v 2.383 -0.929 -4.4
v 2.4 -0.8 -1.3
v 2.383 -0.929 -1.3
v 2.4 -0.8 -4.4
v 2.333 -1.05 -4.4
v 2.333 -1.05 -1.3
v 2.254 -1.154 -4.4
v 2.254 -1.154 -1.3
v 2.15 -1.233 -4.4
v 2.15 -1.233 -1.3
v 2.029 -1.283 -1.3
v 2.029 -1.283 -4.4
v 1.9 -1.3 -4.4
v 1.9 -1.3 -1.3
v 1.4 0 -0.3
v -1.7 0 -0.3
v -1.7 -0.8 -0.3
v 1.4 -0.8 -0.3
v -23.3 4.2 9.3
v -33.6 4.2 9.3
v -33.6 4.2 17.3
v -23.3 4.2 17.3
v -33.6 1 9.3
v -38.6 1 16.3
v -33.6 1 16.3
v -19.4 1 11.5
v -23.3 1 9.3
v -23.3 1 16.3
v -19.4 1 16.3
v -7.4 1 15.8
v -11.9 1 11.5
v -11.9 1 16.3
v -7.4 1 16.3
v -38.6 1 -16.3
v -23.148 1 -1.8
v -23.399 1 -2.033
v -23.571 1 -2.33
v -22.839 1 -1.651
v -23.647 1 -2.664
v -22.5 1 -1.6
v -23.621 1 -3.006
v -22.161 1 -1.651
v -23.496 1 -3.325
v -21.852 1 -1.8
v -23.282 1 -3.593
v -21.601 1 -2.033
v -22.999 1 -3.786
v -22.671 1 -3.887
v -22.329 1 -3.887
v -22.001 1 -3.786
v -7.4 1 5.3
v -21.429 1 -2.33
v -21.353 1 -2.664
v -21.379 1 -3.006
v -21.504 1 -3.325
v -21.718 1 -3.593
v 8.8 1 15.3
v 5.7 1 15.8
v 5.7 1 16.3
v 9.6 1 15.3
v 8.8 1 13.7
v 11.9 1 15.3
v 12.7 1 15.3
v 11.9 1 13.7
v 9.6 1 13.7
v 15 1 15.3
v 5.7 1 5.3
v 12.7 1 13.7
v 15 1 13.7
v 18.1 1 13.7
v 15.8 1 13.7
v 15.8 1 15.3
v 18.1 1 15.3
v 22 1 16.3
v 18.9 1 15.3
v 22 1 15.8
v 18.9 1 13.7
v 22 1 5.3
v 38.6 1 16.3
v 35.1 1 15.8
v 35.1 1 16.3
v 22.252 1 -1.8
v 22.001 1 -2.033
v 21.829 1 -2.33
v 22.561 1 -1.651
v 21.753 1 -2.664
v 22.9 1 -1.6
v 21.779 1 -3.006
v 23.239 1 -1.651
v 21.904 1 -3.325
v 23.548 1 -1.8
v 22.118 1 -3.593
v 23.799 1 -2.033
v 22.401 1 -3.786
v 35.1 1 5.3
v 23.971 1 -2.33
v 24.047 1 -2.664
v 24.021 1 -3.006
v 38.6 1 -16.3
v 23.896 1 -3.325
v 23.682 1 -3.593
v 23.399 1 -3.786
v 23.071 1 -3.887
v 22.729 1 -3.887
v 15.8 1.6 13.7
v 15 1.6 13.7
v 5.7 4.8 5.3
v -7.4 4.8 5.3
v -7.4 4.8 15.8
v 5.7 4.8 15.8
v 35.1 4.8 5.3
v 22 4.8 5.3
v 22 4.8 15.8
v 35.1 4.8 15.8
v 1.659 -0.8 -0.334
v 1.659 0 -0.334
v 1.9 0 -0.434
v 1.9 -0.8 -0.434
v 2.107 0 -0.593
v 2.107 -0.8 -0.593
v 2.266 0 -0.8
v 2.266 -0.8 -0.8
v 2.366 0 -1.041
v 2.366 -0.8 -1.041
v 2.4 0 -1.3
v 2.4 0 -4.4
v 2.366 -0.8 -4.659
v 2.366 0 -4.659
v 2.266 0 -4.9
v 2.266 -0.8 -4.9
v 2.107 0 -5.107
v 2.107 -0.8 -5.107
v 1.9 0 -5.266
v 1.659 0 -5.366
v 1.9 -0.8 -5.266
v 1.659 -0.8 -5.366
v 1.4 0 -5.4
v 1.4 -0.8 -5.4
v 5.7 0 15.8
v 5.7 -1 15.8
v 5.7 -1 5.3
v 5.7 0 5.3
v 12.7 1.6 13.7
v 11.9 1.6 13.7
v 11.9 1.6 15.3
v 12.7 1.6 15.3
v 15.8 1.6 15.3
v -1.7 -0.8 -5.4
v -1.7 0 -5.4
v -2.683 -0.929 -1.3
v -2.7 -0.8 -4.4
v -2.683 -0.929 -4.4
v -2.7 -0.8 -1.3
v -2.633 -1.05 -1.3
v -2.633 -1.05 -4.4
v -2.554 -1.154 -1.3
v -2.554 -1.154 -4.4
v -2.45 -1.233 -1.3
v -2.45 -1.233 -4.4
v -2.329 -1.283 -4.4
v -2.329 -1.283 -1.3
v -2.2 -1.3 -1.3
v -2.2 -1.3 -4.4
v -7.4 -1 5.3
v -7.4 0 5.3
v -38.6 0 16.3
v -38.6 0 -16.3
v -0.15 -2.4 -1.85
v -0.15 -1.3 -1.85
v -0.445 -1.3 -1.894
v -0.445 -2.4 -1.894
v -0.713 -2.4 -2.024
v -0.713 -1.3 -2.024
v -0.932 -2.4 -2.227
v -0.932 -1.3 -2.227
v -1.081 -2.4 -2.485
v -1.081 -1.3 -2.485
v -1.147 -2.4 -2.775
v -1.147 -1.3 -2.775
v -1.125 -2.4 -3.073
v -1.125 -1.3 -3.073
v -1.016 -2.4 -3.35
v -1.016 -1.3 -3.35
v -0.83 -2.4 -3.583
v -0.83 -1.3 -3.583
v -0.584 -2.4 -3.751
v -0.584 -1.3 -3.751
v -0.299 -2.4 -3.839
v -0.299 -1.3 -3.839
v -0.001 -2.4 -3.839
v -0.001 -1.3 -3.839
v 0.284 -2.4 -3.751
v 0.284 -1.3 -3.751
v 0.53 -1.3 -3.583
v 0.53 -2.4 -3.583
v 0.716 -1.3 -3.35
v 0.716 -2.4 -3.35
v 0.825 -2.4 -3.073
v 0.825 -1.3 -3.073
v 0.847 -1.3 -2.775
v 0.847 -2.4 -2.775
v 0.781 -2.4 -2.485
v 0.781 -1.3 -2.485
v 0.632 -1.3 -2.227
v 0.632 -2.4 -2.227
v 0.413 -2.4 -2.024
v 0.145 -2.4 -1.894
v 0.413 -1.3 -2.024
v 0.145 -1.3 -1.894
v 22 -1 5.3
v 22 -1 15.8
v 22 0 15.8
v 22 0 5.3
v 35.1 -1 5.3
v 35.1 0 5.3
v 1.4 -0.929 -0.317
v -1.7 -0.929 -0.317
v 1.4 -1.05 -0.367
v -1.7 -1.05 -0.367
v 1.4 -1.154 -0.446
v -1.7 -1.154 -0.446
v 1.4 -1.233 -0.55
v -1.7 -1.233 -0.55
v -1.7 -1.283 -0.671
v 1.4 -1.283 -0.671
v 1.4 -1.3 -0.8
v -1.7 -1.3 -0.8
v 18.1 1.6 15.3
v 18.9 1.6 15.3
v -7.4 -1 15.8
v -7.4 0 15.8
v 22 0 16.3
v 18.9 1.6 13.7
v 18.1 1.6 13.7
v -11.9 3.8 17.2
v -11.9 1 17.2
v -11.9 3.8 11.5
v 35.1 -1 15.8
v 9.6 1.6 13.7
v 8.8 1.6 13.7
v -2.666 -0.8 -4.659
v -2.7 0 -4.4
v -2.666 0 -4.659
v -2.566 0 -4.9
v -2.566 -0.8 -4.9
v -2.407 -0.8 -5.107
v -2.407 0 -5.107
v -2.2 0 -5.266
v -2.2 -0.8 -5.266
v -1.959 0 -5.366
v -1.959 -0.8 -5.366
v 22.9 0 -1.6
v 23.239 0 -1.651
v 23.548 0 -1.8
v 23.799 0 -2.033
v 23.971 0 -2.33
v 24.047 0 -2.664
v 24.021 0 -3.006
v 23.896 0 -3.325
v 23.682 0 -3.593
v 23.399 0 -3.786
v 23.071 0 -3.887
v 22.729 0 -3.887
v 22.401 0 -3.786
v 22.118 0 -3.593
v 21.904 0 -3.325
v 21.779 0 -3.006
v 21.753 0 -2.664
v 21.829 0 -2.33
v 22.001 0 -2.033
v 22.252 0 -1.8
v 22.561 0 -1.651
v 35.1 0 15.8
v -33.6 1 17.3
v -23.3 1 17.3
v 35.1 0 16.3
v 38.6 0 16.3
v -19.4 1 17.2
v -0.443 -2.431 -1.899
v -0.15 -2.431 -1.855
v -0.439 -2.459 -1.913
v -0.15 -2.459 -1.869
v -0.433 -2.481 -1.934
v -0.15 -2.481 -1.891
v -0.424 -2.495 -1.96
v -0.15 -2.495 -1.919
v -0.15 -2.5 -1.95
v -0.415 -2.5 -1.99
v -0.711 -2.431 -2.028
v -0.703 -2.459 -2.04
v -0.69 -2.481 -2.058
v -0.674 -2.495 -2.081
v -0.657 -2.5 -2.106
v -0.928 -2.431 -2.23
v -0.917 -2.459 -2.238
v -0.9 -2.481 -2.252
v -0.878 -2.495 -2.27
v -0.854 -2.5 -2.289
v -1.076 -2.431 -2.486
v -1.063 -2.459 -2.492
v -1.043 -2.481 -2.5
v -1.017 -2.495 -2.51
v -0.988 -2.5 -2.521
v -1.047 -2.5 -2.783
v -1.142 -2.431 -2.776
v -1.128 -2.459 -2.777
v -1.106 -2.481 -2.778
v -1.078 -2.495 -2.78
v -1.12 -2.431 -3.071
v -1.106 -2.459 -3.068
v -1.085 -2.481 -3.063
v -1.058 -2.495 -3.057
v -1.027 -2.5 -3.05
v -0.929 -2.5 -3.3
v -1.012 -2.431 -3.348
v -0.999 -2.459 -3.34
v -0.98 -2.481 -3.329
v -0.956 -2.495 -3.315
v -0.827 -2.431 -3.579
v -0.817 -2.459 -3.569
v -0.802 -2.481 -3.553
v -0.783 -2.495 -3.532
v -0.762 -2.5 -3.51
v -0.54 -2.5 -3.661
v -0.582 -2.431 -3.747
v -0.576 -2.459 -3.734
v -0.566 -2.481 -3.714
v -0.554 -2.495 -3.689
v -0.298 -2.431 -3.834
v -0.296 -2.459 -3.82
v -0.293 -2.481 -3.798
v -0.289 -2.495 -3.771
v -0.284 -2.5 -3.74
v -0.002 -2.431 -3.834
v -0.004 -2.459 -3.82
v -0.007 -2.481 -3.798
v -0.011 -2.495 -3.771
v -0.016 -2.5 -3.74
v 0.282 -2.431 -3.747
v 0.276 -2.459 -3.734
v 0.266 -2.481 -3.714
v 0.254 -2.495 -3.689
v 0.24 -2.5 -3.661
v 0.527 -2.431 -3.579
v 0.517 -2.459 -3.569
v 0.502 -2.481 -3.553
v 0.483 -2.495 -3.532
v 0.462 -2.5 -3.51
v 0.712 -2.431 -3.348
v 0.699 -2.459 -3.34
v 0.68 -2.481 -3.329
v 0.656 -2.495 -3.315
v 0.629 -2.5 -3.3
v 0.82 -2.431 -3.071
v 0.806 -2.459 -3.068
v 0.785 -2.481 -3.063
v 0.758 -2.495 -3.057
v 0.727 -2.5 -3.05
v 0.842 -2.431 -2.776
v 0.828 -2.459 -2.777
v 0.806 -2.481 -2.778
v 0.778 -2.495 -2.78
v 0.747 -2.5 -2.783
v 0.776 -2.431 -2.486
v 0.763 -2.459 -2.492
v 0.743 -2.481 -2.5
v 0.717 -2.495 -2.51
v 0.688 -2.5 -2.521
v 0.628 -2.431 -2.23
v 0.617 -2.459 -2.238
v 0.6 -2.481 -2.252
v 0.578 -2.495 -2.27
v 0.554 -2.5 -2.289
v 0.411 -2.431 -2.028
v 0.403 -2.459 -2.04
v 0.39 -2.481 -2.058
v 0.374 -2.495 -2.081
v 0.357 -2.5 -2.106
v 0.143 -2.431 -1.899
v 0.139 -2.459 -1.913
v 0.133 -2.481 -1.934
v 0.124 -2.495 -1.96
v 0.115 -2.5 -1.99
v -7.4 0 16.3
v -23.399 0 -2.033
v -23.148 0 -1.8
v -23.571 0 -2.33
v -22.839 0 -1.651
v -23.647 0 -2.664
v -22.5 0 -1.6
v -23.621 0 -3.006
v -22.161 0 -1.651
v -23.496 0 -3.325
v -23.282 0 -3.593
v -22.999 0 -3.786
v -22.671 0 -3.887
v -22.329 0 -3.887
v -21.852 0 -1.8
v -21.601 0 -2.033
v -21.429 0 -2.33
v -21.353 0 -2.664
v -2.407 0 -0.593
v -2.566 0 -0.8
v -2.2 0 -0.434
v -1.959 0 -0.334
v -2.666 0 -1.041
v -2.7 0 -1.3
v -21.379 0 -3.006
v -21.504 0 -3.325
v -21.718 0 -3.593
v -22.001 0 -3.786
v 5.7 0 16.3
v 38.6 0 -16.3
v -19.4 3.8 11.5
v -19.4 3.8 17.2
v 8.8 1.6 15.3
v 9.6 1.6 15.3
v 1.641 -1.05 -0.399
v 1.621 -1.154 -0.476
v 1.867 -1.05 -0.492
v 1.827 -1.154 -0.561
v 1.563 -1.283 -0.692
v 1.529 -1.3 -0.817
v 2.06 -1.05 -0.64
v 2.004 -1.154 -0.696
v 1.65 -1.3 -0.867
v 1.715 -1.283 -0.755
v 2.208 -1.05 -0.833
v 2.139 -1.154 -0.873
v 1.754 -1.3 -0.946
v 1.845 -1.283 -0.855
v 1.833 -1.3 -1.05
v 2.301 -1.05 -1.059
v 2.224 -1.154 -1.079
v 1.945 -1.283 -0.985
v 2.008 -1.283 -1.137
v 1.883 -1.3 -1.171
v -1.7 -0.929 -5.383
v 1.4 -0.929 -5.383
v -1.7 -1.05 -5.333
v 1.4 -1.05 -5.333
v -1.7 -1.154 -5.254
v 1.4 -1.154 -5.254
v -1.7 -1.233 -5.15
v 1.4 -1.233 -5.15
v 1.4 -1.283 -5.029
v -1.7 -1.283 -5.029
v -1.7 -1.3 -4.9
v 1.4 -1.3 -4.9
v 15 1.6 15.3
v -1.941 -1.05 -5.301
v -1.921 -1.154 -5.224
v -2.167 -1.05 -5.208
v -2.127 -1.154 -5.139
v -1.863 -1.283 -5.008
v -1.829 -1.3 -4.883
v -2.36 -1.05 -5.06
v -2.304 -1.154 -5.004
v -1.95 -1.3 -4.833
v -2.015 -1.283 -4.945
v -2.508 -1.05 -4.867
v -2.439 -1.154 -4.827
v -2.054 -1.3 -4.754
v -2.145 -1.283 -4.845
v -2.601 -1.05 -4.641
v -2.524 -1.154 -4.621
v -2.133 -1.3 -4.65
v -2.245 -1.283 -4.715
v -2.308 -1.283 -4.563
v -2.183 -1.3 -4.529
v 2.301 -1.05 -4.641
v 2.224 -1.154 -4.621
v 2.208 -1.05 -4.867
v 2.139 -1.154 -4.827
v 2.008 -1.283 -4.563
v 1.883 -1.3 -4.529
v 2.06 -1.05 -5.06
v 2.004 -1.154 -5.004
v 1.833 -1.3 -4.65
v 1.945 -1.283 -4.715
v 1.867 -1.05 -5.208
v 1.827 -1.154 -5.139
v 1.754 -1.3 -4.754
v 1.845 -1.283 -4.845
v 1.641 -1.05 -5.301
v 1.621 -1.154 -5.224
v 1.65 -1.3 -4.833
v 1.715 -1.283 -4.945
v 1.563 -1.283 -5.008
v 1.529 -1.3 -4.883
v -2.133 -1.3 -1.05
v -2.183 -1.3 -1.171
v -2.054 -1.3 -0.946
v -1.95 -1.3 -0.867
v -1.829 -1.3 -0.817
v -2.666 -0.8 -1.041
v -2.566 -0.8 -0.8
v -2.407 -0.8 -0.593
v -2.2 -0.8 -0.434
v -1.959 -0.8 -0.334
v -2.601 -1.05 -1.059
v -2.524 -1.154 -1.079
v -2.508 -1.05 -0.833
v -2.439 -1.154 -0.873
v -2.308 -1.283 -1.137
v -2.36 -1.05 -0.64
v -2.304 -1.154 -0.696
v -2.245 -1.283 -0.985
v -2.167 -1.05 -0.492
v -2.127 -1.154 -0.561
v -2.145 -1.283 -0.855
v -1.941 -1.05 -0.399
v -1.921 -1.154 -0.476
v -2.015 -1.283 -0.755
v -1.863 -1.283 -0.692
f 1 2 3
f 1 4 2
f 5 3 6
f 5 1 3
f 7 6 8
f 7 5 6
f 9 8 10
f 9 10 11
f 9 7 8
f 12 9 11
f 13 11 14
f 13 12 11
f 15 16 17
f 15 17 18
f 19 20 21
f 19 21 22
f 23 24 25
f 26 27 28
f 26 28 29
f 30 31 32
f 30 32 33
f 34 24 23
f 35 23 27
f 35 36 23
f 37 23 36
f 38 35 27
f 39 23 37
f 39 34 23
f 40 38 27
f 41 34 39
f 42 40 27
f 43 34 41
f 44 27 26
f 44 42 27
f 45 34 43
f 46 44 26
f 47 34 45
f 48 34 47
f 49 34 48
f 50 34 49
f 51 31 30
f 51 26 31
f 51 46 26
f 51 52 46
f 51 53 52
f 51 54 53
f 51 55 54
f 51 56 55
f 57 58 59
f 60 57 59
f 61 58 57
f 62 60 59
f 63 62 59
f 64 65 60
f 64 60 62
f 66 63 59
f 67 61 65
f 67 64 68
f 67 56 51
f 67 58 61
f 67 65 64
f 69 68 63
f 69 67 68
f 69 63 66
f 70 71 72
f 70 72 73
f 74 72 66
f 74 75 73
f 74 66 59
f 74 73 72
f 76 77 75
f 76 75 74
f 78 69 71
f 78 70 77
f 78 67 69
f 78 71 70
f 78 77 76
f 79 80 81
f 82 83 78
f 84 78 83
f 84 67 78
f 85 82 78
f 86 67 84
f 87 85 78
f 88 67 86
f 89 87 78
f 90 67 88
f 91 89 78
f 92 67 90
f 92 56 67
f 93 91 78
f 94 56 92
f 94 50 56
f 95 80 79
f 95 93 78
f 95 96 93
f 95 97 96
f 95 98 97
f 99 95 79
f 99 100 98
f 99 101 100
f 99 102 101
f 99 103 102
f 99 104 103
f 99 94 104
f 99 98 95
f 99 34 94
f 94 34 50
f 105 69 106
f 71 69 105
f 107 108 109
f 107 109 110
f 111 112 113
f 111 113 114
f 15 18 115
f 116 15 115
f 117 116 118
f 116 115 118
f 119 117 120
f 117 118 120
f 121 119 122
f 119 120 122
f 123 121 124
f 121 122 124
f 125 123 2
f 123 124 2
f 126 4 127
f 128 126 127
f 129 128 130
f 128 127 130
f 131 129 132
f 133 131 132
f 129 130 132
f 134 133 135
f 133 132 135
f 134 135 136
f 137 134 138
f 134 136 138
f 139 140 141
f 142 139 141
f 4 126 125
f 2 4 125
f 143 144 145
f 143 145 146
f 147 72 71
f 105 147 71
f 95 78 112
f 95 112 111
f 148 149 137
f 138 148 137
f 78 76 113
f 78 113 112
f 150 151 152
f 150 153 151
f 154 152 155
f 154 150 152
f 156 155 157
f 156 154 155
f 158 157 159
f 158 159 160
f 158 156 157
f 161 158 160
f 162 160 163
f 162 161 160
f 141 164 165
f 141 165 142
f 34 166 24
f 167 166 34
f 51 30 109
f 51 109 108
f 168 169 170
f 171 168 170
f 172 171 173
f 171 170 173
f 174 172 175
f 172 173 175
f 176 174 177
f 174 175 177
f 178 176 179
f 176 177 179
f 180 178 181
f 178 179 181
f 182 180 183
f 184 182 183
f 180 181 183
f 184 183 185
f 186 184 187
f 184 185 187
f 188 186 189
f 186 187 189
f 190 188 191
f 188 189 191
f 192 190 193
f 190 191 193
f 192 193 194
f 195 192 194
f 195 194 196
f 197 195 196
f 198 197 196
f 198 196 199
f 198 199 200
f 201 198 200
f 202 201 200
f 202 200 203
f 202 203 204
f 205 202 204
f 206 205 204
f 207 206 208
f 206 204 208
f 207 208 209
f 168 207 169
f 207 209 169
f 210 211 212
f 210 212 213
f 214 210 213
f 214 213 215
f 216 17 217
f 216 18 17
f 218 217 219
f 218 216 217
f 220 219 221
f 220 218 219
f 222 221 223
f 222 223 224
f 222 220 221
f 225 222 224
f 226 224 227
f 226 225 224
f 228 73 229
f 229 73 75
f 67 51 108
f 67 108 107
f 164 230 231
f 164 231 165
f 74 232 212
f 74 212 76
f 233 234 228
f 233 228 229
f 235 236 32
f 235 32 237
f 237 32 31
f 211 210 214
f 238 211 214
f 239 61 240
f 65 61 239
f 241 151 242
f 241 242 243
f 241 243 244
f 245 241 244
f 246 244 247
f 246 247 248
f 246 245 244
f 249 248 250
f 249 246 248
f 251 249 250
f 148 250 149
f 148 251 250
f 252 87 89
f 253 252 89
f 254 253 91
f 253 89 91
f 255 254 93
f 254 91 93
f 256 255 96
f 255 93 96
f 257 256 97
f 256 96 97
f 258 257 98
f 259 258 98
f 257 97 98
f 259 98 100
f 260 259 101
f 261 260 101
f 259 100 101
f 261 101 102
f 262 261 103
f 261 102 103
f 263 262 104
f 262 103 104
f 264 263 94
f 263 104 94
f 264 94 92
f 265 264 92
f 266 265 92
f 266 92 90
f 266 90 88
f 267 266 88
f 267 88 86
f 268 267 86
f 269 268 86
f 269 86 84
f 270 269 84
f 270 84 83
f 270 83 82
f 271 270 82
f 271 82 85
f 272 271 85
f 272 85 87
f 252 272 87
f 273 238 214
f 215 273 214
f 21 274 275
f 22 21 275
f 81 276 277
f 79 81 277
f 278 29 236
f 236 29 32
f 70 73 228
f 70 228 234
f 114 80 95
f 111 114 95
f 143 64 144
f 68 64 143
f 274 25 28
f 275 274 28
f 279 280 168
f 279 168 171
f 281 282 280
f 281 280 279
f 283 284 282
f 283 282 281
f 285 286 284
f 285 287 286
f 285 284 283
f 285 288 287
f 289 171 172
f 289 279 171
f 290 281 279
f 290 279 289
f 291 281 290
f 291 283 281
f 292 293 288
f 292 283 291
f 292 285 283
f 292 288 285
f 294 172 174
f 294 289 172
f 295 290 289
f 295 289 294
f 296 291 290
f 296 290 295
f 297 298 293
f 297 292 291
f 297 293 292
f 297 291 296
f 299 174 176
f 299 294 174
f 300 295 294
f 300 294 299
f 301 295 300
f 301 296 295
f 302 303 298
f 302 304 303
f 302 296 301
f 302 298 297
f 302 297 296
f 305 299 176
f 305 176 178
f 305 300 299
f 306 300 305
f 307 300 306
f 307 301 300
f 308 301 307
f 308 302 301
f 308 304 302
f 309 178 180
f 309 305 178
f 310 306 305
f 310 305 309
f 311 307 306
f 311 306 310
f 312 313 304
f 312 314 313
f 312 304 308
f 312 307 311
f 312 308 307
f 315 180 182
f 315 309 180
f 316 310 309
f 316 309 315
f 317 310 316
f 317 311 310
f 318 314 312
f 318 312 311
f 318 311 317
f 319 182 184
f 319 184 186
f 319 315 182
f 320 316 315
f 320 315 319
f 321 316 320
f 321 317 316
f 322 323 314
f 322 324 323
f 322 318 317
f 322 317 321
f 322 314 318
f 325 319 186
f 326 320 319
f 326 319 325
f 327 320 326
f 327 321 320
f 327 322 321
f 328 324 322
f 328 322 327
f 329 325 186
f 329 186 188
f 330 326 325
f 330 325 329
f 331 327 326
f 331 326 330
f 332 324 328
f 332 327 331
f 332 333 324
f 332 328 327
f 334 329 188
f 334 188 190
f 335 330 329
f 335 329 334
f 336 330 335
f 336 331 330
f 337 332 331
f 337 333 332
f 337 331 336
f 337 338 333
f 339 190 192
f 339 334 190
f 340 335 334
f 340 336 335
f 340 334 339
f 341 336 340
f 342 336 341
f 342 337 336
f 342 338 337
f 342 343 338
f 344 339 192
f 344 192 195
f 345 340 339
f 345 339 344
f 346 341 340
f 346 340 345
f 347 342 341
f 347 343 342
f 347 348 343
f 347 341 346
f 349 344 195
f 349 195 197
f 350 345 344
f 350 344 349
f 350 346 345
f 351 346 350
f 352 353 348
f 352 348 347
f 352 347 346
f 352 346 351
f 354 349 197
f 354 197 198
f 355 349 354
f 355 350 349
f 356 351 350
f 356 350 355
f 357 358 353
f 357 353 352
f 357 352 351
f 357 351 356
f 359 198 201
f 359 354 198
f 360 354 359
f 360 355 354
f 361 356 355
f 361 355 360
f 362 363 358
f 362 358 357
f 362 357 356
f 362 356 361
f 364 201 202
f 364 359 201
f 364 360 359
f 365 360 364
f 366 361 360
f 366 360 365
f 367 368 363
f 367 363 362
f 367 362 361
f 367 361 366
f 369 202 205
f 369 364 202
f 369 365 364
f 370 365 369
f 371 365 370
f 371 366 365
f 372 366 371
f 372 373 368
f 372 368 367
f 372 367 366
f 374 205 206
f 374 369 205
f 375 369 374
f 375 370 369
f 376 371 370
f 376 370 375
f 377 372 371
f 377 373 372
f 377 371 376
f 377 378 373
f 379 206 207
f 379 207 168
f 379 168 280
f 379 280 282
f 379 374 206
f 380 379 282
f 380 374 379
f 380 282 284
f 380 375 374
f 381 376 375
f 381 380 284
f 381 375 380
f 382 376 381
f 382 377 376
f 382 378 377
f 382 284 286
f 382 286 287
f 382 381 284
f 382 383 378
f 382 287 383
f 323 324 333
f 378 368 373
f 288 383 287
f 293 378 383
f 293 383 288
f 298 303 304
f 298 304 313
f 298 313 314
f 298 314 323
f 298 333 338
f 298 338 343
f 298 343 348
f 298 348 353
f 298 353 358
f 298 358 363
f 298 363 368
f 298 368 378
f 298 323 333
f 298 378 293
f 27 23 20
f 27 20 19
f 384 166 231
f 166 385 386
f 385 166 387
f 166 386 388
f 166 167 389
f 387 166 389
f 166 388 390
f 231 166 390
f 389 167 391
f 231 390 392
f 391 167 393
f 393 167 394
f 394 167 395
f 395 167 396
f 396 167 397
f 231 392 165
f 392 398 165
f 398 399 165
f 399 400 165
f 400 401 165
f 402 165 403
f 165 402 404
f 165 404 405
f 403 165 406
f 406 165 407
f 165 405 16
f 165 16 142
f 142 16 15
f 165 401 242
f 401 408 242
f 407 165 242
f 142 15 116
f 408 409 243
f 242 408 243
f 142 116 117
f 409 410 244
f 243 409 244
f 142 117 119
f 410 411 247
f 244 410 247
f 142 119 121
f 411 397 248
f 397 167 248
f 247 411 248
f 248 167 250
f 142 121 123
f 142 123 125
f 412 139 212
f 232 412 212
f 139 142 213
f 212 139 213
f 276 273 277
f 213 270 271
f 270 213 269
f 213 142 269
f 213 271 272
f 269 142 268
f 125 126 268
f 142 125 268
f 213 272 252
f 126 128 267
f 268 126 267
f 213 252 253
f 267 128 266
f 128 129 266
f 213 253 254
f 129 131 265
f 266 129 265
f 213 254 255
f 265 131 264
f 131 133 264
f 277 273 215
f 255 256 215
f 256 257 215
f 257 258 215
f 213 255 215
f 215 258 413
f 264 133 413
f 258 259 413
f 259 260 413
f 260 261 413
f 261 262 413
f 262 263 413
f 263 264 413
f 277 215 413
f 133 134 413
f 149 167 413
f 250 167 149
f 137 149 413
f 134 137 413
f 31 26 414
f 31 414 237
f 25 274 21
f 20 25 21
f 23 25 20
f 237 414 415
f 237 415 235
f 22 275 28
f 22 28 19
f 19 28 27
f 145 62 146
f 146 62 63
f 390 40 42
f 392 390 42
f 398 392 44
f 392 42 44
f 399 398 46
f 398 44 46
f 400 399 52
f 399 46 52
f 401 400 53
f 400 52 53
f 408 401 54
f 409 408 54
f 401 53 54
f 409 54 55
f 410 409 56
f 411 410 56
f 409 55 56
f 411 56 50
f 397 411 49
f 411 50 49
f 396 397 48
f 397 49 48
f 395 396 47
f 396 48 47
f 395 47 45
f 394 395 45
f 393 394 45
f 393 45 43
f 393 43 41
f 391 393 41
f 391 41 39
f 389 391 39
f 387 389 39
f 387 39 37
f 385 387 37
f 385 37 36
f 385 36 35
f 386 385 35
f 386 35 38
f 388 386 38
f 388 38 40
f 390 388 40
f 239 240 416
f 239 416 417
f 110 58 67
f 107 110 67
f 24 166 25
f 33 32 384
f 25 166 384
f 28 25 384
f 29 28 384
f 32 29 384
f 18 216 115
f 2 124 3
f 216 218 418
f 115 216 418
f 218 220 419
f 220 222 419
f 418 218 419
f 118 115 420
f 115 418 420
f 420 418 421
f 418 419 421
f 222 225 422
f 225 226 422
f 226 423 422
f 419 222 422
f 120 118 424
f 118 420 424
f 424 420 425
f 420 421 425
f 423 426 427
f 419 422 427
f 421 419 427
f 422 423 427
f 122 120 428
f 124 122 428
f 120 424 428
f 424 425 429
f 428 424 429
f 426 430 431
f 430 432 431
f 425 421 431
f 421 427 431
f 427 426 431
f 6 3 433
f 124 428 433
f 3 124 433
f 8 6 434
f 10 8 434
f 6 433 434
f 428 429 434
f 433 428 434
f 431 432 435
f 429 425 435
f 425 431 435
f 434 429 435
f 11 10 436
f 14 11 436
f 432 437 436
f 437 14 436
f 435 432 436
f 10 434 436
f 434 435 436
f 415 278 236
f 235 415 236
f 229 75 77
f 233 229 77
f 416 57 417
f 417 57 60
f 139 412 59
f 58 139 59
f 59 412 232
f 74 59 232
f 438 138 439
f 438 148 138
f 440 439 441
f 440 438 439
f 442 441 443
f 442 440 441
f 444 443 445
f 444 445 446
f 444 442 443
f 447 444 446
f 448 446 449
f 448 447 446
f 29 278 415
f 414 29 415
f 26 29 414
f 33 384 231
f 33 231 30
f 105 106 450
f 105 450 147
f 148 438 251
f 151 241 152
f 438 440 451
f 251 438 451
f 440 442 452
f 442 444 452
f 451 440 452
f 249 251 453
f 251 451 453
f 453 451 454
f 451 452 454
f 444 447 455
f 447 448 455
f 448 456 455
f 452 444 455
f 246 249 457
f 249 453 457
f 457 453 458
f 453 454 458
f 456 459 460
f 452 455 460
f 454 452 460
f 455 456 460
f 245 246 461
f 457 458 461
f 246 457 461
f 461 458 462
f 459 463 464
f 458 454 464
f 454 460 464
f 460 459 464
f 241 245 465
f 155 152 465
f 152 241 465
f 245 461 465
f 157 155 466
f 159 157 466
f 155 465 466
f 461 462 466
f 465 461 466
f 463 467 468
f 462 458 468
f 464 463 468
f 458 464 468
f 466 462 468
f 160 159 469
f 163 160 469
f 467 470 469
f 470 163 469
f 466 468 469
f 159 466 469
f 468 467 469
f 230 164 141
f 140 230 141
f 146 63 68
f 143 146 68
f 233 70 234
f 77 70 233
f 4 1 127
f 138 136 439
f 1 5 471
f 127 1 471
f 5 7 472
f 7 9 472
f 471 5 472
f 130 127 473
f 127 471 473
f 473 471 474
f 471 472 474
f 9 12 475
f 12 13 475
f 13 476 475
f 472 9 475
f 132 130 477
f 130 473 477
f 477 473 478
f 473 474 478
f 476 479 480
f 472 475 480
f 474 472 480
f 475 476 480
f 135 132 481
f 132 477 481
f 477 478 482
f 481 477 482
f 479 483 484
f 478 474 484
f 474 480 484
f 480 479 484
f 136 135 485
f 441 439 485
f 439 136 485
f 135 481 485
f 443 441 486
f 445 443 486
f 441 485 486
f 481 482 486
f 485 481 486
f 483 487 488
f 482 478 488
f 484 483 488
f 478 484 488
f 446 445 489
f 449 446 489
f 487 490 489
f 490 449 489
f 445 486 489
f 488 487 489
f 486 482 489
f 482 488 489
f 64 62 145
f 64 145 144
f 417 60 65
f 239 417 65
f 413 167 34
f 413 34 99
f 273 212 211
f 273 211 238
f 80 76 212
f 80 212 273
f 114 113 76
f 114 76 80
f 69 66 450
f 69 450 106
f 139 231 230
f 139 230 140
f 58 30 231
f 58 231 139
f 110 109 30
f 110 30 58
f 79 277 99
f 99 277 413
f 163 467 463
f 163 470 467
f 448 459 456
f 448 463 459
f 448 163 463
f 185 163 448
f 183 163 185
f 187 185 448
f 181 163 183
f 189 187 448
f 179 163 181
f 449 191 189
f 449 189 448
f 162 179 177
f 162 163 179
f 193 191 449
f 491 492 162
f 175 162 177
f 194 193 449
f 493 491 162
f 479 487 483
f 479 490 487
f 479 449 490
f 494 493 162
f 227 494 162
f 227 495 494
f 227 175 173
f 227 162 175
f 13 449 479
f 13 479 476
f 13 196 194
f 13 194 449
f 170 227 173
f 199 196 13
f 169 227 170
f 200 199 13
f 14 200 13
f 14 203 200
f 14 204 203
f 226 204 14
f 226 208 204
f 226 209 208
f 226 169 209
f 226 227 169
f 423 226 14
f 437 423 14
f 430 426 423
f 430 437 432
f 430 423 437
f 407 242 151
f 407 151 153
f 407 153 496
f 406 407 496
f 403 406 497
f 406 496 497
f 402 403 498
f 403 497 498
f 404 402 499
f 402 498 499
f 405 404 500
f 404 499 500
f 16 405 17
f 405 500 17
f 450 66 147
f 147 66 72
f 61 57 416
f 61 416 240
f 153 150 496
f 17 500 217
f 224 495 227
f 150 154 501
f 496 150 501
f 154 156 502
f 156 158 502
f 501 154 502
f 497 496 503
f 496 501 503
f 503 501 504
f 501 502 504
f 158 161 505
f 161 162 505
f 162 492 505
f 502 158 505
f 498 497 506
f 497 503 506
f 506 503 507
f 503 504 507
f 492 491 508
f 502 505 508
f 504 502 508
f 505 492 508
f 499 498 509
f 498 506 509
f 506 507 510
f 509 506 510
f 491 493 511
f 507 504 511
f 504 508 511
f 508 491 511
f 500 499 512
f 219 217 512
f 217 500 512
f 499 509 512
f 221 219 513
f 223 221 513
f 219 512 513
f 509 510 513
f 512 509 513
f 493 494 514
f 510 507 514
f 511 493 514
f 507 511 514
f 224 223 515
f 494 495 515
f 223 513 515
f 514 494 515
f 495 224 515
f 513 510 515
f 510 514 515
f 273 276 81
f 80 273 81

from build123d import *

# Parameters (mm, degrees)
SKETCH1_W                = 77.2
SKETCH1_H                = 32.6
BOSS_EXTRUDE1_DEPTH      = 1
BOSS_EXTRUDE2_DEPTH      = 3.8
BOSS_EXTRUDE2_DEPTH_BACK = 2
SKETCH2_W                = 13.1
SKETCH2_H                = 11
SKETCH3_W                = 7.5
SKETCH3_H                = 5.7
BOSS_EXTRUDE3_DEPTH      = 2.8
SKETCH4_W                = 10.3
SKETCH4_H                = 8
BOSS_EXTRUDE4_DEPTH      = 3.2
SKETCH5_W                = 13.1
SKETCH5_H                = 5.8
CUT_EXTRUDE1_DEPTH       = 0.5
SKETCH6_W                = 0.8
SKETCH6_H                = 1.6
BOSS_EXTRUDE5_DEPTH      = 0.6
LPATTERN1_COUNT          = 4
LPATTERN1_PITCH          = 3.1
SKETCH7_W                = 5.1
SKETCH7_H                = 5.1
BOSS_EXTRUDE6_DEPTH      = 1.3
SKETCH8_R                = 1
BOSS_EXTRUDE7_DEPTH      = 1.2
FILLET1_R                = 1
FILLET2_R                = 0.5
FILLET3_R                = 0.1
SKETCH9_R                = 1.15
CUT_EXTRUDE2_DEPTH       = 43.469871674


with BuildPart() as part:
    # Sketch1 → Boss-Extrude1 (new body)
    with BuildSketch(Plane(origin=(0, 0, 0), x_dir=(1, 0, 0), z_dir=(0, 1, 0))):
        Rectangle(SKETCH1_W, SKETCH1_H)
    extrude(amount=BOSS_EXTRUDE1_DEPTH)

    # Sketch2 → Boss-Extrude2 (add, two sides: drawn at the far end of the back side and taken through both)
    with BuildSketch(Plane(origin=(0, 1, 0), x_dir=(1, 0, 0), z_dir=(0, 1, 0)).offset(-BOSS_EXTRUDE2_DEPTH_BACK)):
        with Locations((28.55, -10.8)):
            Rectangle(SKETCH2_W, SKETCH2_H)
        with Locations((-0.85, -10.8)):
            Rectangle(SKETCH2_W, SKETCH2_H)
    extrude(amount=BOSS_EXTRUDE2_DEPTH + BOSS_EXTRUDE2_DEPTH_BACK)

    # Sketch3 → Boss-Extrude3 (add)
    with BuildSketch(Plane(origin=(0, 1, 0), x_dir=(1, 0, 0), z_dir=(0, 1, 0))):
        with Locations((-15.65, -14.35)):
            Rectangle(SKETCH3_W, SKETCH3_H)
    extrude(amount=BOSS_EXTRUDE3_DEPTH)

    # Sketch4 → Boss-Extrude4 (add)
    with BuildSketch(Plane(origin=(0, 1, 0), x_dir=(1, 0, 0), z_dir=(0, 1, 0))):
        with Locations((-28.45, -13.3)):
            Rectangle(SKETCH4_W, SKETCH4_H)
    extrude(amount=BOSS_EXTRUDE4_DEPTH)

    # Sketch5 → Cut-Extrude1 (cut)
    with BuildSketch(Plane.XY.offset(16.3)):
        with Locations((-0.85, 1.9)):
            Rectangle(SKETCH5_W, SKETCH5_H)
        with Locations((28.55, 1.9)):
            Rectangle(SKETCH5_W, SKETCH5_H)
    extrude(amount=-CUT_EXTRUDE1_DEPTH, mode=Mode.SUBTRACT)

    # Sketch6 → Boss-Extrude5 (add)
    with BuildSketch(Plane(origin=(0, 1, 0), x_dir=(1, 0, 0), z_dir=(0, 1, 0))):
        with Locations((18.5, -14.5)):
            Rectangle(SKETCH6_W, SKETCH6_H)
    boss_extrude5 = extrude(amount=BOSS_EXTRUDE5_DEPTH)

    # LPattern1: Boss-Extrude5 ×4
    with Locations(*[(-i * LPATTERN1_PITCH, 0, 0) for i in range(1, LPATTERN1_COUNT)]):
        add(boss_extrude5)

    # Sketch7 → Boss-Extrude6 (add)
    with BuildSketch(Plane.XZ):
        with Locations((-0.15, -2.85)):
            Rectangle(SKETCH7_W, SKETCH7_H)
    extrude(amount=BOSS_EXTRUDE6_DEPTH)

    # Sketch8 → Boss-Extrude7 (add)
    with BuildSketch(Plane.XZ.offset(1.3)):
        with Locations(Location((-0.15, -2.85, 0), (0, 0, 90))):
            Circle(SKETCH8_R)
    extrude(amount=BOSS_EXTRUDE7_DEPTH)

    # Fillet1
    fillet1_edges = [part.edges().sort_by_distance(p)[0] for p in [
        (-2.7, -0.65, -0.3),
        (-2.7, -0.65, -5.4),
        (2.4, -0.65, -5.4),
        (2.4, -0.65, -0.3),
    ]]
    fillet(fillet1_edges, radius=FILLET1_R)

    # Fillet2
    fillet2_edges = [part.edges().sort_by_distance(p)[0] for p in [
        (-2.7, -1.3, -2.85),
        (-0.15, -1.3, -0.3),
        (-0.15, -1.3, -5.4),
        (2.4, -1.3, -2.85),
        (2.107106781, -1.3, -0.592893219),
        (-2.407106781, -1.3, -5.107106781),
        (2.107106781, -1.3, -5.107106781),
        (-2.407106781, -1.3, -0.592893219),
    ]]
    fillet(fillet2_edges, radius=FILLET2_R)

    # Fillet3
    fillet3_edges = [part.edges().sort_by_distance(p)[0] for p in [
        (-0.15, -2.5, -3.85),
    ]]
    fillet(fillet3_edges, radius=FILLET3_R)

    # Sketch9 → Cut-Extrude2 (cut, through all)
    with BuildSketch(Plane(origin=(0, 1, 0), x_dir=(1, 0, 0), z_dir=(0, 1, 0))):
        with Locations(Location((-22.5, 2.75, 0), (0, 0, 270))):
            Circle(SKETCH9_R)
        with Locations(Location((22.9, 2.75, 0), (0, 0, 270))):
            Circle(SKETCH9_R)
    extrude(amount=-CUT_EXTRUDE2_DEPTH, mode=Mode.SUBTRACT)


solid = part.part
